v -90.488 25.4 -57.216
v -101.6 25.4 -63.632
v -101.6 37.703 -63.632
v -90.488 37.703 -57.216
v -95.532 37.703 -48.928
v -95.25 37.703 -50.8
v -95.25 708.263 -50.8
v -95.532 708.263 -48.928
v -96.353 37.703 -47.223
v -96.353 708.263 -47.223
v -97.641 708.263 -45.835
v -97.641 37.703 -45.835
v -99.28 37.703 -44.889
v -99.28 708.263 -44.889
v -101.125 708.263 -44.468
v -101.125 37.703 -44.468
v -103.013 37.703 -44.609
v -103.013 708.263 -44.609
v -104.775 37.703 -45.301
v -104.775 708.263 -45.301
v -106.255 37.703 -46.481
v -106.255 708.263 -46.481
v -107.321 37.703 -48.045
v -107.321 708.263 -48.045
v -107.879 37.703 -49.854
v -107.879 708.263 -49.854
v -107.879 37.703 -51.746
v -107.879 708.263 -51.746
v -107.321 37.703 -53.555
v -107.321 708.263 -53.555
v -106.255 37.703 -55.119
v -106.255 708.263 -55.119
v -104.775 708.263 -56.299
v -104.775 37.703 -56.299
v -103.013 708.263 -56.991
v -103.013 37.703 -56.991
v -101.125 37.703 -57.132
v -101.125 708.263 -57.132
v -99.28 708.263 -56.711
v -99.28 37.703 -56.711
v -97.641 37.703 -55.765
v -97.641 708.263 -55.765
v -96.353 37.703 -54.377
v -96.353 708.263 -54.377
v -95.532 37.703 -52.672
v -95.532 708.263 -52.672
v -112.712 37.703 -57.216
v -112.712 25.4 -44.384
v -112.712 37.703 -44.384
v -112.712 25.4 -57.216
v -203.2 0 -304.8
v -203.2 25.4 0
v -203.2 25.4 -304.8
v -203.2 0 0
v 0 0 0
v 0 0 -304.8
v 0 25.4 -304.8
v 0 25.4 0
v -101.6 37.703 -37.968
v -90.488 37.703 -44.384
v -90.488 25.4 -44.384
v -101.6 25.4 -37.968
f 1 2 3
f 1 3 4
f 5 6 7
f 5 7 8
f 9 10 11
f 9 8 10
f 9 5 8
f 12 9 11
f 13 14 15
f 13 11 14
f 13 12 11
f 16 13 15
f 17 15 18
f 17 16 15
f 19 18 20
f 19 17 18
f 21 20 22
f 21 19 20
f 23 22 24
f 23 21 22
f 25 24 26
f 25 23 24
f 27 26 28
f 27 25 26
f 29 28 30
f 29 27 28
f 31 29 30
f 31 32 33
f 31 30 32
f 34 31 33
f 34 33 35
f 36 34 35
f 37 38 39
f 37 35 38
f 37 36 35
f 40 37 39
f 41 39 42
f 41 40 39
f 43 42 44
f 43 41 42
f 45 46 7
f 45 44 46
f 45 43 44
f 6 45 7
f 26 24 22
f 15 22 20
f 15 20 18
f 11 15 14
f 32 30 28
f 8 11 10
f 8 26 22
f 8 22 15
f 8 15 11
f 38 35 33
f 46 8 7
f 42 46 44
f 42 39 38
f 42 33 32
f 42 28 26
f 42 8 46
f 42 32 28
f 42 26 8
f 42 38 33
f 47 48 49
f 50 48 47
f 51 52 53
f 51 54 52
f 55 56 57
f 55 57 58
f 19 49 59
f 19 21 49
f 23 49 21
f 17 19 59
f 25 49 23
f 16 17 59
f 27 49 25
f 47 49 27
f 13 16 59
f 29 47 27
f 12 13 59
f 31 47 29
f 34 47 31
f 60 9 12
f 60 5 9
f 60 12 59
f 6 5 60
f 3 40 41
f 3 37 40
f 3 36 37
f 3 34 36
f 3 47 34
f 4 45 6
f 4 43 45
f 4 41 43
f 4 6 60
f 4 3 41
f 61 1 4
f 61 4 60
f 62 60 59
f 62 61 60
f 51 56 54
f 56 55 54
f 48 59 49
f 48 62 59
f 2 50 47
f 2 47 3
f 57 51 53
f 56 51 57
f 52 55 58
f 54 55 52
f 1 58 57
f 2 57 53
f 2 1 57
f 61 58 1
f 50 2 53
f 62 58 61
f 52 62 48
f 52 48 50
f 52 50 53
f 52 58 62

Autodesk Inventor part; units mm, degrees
ref_plane "YZ Plane" through (0, 0, 0) normal (1, 0, 0) x (0, 1, 0)
ref_plane "XZ Plane" through (0, 0, 0) normal (0, 1, 0) x (-1, 0, 0)
ref_plane "XY Plane" through (0, 0, 0) normal (0, 0, 1) x (1, 0, 0)
sketch "Sketch1" plane through (0, 0, 0) normal (0, 1, 0) x (-1, 0, 0)
  line L0 (0, 0) -> (203.2, 0)
  line L1 (203.2, 0) -> (203.2, -304.8)
  line L2 (203.2, -304.8) -> (0, -304.8)
  line L3 (0, -304.8) -> (0, 0)
  dimension "d0" = 203.2
  dimension "d1" = 304.8
extrude "Extrusion1" add sketch "Sketch1" along normal blind 25.4
sketch "Sketch2" plane through (0, 25.4, 0) normal (0, 1, 0) x (1, 0, 0)
  line L0 (-203.2, 0) -> (0, 0) construction
  line L1 (-101.6, 0) -> (-101.6, 50.8) construction
  line L2 (-101.6, 63.6316) -> (-90.4875, 57.2158)
  line L3 (-90.4875, 57.2158) -> (-90.4875, 44.3842)
  line L4 (-90.4875, 44.3842) -> (-101.6, 37.9684)
  line L5 (-101.6, 37.9684) -> (-112.7125, 44.3842)
  line L6 (-112.7125, 44.3842) -> (-112.7125, 57.2158)
  line L7 (-112.7125, 57.2158) -> (-101.6, 63.6316)
  dimension "d4" = 50.8
  dimension "d9" = 22.225
extrude "Extrusion2" add sketch "Sketch2" along normal blind 12.3031
sketch "Sketch3" plane through (0, 37.7031, 0) normal (0, 1, 0) x (1, 0, 0)
  line L0 (-112.7125, 57.2158) -> (-112.7125, 44.3842) projected
  line L1 (-112.7125, 44.3842) -> (-101.6, 37.9684) projected
  line L2 (-101.6, 37.9684) -> (-90.4875, 44.3842) projected
  line L3 (-90.4875, 44.3842) -> (-90.4875, 57.2158) projected
  line L4 (-90.4875, 57.2158) -> (-101.6, 63.6316) projected
  line L5 (-101.6, 63.6316) -> (-112.7125, 57.2158) projected
  line L6 (-101.6, 37.9684) -> (-112.7125, 44.3842) construction
  line L7 (-101.6, 63.6316) -> (-101.6, 37.9684) construction
  circle A0 centre (-101.6, 50.8) radius 6.35
  point P0 (0, 0)
  dimension "d8" = 12.7
extrude "Extrusion3" add sketch "Sketch3" along normal blind 670.56 contours A0
properties part number "Ring Stand"
